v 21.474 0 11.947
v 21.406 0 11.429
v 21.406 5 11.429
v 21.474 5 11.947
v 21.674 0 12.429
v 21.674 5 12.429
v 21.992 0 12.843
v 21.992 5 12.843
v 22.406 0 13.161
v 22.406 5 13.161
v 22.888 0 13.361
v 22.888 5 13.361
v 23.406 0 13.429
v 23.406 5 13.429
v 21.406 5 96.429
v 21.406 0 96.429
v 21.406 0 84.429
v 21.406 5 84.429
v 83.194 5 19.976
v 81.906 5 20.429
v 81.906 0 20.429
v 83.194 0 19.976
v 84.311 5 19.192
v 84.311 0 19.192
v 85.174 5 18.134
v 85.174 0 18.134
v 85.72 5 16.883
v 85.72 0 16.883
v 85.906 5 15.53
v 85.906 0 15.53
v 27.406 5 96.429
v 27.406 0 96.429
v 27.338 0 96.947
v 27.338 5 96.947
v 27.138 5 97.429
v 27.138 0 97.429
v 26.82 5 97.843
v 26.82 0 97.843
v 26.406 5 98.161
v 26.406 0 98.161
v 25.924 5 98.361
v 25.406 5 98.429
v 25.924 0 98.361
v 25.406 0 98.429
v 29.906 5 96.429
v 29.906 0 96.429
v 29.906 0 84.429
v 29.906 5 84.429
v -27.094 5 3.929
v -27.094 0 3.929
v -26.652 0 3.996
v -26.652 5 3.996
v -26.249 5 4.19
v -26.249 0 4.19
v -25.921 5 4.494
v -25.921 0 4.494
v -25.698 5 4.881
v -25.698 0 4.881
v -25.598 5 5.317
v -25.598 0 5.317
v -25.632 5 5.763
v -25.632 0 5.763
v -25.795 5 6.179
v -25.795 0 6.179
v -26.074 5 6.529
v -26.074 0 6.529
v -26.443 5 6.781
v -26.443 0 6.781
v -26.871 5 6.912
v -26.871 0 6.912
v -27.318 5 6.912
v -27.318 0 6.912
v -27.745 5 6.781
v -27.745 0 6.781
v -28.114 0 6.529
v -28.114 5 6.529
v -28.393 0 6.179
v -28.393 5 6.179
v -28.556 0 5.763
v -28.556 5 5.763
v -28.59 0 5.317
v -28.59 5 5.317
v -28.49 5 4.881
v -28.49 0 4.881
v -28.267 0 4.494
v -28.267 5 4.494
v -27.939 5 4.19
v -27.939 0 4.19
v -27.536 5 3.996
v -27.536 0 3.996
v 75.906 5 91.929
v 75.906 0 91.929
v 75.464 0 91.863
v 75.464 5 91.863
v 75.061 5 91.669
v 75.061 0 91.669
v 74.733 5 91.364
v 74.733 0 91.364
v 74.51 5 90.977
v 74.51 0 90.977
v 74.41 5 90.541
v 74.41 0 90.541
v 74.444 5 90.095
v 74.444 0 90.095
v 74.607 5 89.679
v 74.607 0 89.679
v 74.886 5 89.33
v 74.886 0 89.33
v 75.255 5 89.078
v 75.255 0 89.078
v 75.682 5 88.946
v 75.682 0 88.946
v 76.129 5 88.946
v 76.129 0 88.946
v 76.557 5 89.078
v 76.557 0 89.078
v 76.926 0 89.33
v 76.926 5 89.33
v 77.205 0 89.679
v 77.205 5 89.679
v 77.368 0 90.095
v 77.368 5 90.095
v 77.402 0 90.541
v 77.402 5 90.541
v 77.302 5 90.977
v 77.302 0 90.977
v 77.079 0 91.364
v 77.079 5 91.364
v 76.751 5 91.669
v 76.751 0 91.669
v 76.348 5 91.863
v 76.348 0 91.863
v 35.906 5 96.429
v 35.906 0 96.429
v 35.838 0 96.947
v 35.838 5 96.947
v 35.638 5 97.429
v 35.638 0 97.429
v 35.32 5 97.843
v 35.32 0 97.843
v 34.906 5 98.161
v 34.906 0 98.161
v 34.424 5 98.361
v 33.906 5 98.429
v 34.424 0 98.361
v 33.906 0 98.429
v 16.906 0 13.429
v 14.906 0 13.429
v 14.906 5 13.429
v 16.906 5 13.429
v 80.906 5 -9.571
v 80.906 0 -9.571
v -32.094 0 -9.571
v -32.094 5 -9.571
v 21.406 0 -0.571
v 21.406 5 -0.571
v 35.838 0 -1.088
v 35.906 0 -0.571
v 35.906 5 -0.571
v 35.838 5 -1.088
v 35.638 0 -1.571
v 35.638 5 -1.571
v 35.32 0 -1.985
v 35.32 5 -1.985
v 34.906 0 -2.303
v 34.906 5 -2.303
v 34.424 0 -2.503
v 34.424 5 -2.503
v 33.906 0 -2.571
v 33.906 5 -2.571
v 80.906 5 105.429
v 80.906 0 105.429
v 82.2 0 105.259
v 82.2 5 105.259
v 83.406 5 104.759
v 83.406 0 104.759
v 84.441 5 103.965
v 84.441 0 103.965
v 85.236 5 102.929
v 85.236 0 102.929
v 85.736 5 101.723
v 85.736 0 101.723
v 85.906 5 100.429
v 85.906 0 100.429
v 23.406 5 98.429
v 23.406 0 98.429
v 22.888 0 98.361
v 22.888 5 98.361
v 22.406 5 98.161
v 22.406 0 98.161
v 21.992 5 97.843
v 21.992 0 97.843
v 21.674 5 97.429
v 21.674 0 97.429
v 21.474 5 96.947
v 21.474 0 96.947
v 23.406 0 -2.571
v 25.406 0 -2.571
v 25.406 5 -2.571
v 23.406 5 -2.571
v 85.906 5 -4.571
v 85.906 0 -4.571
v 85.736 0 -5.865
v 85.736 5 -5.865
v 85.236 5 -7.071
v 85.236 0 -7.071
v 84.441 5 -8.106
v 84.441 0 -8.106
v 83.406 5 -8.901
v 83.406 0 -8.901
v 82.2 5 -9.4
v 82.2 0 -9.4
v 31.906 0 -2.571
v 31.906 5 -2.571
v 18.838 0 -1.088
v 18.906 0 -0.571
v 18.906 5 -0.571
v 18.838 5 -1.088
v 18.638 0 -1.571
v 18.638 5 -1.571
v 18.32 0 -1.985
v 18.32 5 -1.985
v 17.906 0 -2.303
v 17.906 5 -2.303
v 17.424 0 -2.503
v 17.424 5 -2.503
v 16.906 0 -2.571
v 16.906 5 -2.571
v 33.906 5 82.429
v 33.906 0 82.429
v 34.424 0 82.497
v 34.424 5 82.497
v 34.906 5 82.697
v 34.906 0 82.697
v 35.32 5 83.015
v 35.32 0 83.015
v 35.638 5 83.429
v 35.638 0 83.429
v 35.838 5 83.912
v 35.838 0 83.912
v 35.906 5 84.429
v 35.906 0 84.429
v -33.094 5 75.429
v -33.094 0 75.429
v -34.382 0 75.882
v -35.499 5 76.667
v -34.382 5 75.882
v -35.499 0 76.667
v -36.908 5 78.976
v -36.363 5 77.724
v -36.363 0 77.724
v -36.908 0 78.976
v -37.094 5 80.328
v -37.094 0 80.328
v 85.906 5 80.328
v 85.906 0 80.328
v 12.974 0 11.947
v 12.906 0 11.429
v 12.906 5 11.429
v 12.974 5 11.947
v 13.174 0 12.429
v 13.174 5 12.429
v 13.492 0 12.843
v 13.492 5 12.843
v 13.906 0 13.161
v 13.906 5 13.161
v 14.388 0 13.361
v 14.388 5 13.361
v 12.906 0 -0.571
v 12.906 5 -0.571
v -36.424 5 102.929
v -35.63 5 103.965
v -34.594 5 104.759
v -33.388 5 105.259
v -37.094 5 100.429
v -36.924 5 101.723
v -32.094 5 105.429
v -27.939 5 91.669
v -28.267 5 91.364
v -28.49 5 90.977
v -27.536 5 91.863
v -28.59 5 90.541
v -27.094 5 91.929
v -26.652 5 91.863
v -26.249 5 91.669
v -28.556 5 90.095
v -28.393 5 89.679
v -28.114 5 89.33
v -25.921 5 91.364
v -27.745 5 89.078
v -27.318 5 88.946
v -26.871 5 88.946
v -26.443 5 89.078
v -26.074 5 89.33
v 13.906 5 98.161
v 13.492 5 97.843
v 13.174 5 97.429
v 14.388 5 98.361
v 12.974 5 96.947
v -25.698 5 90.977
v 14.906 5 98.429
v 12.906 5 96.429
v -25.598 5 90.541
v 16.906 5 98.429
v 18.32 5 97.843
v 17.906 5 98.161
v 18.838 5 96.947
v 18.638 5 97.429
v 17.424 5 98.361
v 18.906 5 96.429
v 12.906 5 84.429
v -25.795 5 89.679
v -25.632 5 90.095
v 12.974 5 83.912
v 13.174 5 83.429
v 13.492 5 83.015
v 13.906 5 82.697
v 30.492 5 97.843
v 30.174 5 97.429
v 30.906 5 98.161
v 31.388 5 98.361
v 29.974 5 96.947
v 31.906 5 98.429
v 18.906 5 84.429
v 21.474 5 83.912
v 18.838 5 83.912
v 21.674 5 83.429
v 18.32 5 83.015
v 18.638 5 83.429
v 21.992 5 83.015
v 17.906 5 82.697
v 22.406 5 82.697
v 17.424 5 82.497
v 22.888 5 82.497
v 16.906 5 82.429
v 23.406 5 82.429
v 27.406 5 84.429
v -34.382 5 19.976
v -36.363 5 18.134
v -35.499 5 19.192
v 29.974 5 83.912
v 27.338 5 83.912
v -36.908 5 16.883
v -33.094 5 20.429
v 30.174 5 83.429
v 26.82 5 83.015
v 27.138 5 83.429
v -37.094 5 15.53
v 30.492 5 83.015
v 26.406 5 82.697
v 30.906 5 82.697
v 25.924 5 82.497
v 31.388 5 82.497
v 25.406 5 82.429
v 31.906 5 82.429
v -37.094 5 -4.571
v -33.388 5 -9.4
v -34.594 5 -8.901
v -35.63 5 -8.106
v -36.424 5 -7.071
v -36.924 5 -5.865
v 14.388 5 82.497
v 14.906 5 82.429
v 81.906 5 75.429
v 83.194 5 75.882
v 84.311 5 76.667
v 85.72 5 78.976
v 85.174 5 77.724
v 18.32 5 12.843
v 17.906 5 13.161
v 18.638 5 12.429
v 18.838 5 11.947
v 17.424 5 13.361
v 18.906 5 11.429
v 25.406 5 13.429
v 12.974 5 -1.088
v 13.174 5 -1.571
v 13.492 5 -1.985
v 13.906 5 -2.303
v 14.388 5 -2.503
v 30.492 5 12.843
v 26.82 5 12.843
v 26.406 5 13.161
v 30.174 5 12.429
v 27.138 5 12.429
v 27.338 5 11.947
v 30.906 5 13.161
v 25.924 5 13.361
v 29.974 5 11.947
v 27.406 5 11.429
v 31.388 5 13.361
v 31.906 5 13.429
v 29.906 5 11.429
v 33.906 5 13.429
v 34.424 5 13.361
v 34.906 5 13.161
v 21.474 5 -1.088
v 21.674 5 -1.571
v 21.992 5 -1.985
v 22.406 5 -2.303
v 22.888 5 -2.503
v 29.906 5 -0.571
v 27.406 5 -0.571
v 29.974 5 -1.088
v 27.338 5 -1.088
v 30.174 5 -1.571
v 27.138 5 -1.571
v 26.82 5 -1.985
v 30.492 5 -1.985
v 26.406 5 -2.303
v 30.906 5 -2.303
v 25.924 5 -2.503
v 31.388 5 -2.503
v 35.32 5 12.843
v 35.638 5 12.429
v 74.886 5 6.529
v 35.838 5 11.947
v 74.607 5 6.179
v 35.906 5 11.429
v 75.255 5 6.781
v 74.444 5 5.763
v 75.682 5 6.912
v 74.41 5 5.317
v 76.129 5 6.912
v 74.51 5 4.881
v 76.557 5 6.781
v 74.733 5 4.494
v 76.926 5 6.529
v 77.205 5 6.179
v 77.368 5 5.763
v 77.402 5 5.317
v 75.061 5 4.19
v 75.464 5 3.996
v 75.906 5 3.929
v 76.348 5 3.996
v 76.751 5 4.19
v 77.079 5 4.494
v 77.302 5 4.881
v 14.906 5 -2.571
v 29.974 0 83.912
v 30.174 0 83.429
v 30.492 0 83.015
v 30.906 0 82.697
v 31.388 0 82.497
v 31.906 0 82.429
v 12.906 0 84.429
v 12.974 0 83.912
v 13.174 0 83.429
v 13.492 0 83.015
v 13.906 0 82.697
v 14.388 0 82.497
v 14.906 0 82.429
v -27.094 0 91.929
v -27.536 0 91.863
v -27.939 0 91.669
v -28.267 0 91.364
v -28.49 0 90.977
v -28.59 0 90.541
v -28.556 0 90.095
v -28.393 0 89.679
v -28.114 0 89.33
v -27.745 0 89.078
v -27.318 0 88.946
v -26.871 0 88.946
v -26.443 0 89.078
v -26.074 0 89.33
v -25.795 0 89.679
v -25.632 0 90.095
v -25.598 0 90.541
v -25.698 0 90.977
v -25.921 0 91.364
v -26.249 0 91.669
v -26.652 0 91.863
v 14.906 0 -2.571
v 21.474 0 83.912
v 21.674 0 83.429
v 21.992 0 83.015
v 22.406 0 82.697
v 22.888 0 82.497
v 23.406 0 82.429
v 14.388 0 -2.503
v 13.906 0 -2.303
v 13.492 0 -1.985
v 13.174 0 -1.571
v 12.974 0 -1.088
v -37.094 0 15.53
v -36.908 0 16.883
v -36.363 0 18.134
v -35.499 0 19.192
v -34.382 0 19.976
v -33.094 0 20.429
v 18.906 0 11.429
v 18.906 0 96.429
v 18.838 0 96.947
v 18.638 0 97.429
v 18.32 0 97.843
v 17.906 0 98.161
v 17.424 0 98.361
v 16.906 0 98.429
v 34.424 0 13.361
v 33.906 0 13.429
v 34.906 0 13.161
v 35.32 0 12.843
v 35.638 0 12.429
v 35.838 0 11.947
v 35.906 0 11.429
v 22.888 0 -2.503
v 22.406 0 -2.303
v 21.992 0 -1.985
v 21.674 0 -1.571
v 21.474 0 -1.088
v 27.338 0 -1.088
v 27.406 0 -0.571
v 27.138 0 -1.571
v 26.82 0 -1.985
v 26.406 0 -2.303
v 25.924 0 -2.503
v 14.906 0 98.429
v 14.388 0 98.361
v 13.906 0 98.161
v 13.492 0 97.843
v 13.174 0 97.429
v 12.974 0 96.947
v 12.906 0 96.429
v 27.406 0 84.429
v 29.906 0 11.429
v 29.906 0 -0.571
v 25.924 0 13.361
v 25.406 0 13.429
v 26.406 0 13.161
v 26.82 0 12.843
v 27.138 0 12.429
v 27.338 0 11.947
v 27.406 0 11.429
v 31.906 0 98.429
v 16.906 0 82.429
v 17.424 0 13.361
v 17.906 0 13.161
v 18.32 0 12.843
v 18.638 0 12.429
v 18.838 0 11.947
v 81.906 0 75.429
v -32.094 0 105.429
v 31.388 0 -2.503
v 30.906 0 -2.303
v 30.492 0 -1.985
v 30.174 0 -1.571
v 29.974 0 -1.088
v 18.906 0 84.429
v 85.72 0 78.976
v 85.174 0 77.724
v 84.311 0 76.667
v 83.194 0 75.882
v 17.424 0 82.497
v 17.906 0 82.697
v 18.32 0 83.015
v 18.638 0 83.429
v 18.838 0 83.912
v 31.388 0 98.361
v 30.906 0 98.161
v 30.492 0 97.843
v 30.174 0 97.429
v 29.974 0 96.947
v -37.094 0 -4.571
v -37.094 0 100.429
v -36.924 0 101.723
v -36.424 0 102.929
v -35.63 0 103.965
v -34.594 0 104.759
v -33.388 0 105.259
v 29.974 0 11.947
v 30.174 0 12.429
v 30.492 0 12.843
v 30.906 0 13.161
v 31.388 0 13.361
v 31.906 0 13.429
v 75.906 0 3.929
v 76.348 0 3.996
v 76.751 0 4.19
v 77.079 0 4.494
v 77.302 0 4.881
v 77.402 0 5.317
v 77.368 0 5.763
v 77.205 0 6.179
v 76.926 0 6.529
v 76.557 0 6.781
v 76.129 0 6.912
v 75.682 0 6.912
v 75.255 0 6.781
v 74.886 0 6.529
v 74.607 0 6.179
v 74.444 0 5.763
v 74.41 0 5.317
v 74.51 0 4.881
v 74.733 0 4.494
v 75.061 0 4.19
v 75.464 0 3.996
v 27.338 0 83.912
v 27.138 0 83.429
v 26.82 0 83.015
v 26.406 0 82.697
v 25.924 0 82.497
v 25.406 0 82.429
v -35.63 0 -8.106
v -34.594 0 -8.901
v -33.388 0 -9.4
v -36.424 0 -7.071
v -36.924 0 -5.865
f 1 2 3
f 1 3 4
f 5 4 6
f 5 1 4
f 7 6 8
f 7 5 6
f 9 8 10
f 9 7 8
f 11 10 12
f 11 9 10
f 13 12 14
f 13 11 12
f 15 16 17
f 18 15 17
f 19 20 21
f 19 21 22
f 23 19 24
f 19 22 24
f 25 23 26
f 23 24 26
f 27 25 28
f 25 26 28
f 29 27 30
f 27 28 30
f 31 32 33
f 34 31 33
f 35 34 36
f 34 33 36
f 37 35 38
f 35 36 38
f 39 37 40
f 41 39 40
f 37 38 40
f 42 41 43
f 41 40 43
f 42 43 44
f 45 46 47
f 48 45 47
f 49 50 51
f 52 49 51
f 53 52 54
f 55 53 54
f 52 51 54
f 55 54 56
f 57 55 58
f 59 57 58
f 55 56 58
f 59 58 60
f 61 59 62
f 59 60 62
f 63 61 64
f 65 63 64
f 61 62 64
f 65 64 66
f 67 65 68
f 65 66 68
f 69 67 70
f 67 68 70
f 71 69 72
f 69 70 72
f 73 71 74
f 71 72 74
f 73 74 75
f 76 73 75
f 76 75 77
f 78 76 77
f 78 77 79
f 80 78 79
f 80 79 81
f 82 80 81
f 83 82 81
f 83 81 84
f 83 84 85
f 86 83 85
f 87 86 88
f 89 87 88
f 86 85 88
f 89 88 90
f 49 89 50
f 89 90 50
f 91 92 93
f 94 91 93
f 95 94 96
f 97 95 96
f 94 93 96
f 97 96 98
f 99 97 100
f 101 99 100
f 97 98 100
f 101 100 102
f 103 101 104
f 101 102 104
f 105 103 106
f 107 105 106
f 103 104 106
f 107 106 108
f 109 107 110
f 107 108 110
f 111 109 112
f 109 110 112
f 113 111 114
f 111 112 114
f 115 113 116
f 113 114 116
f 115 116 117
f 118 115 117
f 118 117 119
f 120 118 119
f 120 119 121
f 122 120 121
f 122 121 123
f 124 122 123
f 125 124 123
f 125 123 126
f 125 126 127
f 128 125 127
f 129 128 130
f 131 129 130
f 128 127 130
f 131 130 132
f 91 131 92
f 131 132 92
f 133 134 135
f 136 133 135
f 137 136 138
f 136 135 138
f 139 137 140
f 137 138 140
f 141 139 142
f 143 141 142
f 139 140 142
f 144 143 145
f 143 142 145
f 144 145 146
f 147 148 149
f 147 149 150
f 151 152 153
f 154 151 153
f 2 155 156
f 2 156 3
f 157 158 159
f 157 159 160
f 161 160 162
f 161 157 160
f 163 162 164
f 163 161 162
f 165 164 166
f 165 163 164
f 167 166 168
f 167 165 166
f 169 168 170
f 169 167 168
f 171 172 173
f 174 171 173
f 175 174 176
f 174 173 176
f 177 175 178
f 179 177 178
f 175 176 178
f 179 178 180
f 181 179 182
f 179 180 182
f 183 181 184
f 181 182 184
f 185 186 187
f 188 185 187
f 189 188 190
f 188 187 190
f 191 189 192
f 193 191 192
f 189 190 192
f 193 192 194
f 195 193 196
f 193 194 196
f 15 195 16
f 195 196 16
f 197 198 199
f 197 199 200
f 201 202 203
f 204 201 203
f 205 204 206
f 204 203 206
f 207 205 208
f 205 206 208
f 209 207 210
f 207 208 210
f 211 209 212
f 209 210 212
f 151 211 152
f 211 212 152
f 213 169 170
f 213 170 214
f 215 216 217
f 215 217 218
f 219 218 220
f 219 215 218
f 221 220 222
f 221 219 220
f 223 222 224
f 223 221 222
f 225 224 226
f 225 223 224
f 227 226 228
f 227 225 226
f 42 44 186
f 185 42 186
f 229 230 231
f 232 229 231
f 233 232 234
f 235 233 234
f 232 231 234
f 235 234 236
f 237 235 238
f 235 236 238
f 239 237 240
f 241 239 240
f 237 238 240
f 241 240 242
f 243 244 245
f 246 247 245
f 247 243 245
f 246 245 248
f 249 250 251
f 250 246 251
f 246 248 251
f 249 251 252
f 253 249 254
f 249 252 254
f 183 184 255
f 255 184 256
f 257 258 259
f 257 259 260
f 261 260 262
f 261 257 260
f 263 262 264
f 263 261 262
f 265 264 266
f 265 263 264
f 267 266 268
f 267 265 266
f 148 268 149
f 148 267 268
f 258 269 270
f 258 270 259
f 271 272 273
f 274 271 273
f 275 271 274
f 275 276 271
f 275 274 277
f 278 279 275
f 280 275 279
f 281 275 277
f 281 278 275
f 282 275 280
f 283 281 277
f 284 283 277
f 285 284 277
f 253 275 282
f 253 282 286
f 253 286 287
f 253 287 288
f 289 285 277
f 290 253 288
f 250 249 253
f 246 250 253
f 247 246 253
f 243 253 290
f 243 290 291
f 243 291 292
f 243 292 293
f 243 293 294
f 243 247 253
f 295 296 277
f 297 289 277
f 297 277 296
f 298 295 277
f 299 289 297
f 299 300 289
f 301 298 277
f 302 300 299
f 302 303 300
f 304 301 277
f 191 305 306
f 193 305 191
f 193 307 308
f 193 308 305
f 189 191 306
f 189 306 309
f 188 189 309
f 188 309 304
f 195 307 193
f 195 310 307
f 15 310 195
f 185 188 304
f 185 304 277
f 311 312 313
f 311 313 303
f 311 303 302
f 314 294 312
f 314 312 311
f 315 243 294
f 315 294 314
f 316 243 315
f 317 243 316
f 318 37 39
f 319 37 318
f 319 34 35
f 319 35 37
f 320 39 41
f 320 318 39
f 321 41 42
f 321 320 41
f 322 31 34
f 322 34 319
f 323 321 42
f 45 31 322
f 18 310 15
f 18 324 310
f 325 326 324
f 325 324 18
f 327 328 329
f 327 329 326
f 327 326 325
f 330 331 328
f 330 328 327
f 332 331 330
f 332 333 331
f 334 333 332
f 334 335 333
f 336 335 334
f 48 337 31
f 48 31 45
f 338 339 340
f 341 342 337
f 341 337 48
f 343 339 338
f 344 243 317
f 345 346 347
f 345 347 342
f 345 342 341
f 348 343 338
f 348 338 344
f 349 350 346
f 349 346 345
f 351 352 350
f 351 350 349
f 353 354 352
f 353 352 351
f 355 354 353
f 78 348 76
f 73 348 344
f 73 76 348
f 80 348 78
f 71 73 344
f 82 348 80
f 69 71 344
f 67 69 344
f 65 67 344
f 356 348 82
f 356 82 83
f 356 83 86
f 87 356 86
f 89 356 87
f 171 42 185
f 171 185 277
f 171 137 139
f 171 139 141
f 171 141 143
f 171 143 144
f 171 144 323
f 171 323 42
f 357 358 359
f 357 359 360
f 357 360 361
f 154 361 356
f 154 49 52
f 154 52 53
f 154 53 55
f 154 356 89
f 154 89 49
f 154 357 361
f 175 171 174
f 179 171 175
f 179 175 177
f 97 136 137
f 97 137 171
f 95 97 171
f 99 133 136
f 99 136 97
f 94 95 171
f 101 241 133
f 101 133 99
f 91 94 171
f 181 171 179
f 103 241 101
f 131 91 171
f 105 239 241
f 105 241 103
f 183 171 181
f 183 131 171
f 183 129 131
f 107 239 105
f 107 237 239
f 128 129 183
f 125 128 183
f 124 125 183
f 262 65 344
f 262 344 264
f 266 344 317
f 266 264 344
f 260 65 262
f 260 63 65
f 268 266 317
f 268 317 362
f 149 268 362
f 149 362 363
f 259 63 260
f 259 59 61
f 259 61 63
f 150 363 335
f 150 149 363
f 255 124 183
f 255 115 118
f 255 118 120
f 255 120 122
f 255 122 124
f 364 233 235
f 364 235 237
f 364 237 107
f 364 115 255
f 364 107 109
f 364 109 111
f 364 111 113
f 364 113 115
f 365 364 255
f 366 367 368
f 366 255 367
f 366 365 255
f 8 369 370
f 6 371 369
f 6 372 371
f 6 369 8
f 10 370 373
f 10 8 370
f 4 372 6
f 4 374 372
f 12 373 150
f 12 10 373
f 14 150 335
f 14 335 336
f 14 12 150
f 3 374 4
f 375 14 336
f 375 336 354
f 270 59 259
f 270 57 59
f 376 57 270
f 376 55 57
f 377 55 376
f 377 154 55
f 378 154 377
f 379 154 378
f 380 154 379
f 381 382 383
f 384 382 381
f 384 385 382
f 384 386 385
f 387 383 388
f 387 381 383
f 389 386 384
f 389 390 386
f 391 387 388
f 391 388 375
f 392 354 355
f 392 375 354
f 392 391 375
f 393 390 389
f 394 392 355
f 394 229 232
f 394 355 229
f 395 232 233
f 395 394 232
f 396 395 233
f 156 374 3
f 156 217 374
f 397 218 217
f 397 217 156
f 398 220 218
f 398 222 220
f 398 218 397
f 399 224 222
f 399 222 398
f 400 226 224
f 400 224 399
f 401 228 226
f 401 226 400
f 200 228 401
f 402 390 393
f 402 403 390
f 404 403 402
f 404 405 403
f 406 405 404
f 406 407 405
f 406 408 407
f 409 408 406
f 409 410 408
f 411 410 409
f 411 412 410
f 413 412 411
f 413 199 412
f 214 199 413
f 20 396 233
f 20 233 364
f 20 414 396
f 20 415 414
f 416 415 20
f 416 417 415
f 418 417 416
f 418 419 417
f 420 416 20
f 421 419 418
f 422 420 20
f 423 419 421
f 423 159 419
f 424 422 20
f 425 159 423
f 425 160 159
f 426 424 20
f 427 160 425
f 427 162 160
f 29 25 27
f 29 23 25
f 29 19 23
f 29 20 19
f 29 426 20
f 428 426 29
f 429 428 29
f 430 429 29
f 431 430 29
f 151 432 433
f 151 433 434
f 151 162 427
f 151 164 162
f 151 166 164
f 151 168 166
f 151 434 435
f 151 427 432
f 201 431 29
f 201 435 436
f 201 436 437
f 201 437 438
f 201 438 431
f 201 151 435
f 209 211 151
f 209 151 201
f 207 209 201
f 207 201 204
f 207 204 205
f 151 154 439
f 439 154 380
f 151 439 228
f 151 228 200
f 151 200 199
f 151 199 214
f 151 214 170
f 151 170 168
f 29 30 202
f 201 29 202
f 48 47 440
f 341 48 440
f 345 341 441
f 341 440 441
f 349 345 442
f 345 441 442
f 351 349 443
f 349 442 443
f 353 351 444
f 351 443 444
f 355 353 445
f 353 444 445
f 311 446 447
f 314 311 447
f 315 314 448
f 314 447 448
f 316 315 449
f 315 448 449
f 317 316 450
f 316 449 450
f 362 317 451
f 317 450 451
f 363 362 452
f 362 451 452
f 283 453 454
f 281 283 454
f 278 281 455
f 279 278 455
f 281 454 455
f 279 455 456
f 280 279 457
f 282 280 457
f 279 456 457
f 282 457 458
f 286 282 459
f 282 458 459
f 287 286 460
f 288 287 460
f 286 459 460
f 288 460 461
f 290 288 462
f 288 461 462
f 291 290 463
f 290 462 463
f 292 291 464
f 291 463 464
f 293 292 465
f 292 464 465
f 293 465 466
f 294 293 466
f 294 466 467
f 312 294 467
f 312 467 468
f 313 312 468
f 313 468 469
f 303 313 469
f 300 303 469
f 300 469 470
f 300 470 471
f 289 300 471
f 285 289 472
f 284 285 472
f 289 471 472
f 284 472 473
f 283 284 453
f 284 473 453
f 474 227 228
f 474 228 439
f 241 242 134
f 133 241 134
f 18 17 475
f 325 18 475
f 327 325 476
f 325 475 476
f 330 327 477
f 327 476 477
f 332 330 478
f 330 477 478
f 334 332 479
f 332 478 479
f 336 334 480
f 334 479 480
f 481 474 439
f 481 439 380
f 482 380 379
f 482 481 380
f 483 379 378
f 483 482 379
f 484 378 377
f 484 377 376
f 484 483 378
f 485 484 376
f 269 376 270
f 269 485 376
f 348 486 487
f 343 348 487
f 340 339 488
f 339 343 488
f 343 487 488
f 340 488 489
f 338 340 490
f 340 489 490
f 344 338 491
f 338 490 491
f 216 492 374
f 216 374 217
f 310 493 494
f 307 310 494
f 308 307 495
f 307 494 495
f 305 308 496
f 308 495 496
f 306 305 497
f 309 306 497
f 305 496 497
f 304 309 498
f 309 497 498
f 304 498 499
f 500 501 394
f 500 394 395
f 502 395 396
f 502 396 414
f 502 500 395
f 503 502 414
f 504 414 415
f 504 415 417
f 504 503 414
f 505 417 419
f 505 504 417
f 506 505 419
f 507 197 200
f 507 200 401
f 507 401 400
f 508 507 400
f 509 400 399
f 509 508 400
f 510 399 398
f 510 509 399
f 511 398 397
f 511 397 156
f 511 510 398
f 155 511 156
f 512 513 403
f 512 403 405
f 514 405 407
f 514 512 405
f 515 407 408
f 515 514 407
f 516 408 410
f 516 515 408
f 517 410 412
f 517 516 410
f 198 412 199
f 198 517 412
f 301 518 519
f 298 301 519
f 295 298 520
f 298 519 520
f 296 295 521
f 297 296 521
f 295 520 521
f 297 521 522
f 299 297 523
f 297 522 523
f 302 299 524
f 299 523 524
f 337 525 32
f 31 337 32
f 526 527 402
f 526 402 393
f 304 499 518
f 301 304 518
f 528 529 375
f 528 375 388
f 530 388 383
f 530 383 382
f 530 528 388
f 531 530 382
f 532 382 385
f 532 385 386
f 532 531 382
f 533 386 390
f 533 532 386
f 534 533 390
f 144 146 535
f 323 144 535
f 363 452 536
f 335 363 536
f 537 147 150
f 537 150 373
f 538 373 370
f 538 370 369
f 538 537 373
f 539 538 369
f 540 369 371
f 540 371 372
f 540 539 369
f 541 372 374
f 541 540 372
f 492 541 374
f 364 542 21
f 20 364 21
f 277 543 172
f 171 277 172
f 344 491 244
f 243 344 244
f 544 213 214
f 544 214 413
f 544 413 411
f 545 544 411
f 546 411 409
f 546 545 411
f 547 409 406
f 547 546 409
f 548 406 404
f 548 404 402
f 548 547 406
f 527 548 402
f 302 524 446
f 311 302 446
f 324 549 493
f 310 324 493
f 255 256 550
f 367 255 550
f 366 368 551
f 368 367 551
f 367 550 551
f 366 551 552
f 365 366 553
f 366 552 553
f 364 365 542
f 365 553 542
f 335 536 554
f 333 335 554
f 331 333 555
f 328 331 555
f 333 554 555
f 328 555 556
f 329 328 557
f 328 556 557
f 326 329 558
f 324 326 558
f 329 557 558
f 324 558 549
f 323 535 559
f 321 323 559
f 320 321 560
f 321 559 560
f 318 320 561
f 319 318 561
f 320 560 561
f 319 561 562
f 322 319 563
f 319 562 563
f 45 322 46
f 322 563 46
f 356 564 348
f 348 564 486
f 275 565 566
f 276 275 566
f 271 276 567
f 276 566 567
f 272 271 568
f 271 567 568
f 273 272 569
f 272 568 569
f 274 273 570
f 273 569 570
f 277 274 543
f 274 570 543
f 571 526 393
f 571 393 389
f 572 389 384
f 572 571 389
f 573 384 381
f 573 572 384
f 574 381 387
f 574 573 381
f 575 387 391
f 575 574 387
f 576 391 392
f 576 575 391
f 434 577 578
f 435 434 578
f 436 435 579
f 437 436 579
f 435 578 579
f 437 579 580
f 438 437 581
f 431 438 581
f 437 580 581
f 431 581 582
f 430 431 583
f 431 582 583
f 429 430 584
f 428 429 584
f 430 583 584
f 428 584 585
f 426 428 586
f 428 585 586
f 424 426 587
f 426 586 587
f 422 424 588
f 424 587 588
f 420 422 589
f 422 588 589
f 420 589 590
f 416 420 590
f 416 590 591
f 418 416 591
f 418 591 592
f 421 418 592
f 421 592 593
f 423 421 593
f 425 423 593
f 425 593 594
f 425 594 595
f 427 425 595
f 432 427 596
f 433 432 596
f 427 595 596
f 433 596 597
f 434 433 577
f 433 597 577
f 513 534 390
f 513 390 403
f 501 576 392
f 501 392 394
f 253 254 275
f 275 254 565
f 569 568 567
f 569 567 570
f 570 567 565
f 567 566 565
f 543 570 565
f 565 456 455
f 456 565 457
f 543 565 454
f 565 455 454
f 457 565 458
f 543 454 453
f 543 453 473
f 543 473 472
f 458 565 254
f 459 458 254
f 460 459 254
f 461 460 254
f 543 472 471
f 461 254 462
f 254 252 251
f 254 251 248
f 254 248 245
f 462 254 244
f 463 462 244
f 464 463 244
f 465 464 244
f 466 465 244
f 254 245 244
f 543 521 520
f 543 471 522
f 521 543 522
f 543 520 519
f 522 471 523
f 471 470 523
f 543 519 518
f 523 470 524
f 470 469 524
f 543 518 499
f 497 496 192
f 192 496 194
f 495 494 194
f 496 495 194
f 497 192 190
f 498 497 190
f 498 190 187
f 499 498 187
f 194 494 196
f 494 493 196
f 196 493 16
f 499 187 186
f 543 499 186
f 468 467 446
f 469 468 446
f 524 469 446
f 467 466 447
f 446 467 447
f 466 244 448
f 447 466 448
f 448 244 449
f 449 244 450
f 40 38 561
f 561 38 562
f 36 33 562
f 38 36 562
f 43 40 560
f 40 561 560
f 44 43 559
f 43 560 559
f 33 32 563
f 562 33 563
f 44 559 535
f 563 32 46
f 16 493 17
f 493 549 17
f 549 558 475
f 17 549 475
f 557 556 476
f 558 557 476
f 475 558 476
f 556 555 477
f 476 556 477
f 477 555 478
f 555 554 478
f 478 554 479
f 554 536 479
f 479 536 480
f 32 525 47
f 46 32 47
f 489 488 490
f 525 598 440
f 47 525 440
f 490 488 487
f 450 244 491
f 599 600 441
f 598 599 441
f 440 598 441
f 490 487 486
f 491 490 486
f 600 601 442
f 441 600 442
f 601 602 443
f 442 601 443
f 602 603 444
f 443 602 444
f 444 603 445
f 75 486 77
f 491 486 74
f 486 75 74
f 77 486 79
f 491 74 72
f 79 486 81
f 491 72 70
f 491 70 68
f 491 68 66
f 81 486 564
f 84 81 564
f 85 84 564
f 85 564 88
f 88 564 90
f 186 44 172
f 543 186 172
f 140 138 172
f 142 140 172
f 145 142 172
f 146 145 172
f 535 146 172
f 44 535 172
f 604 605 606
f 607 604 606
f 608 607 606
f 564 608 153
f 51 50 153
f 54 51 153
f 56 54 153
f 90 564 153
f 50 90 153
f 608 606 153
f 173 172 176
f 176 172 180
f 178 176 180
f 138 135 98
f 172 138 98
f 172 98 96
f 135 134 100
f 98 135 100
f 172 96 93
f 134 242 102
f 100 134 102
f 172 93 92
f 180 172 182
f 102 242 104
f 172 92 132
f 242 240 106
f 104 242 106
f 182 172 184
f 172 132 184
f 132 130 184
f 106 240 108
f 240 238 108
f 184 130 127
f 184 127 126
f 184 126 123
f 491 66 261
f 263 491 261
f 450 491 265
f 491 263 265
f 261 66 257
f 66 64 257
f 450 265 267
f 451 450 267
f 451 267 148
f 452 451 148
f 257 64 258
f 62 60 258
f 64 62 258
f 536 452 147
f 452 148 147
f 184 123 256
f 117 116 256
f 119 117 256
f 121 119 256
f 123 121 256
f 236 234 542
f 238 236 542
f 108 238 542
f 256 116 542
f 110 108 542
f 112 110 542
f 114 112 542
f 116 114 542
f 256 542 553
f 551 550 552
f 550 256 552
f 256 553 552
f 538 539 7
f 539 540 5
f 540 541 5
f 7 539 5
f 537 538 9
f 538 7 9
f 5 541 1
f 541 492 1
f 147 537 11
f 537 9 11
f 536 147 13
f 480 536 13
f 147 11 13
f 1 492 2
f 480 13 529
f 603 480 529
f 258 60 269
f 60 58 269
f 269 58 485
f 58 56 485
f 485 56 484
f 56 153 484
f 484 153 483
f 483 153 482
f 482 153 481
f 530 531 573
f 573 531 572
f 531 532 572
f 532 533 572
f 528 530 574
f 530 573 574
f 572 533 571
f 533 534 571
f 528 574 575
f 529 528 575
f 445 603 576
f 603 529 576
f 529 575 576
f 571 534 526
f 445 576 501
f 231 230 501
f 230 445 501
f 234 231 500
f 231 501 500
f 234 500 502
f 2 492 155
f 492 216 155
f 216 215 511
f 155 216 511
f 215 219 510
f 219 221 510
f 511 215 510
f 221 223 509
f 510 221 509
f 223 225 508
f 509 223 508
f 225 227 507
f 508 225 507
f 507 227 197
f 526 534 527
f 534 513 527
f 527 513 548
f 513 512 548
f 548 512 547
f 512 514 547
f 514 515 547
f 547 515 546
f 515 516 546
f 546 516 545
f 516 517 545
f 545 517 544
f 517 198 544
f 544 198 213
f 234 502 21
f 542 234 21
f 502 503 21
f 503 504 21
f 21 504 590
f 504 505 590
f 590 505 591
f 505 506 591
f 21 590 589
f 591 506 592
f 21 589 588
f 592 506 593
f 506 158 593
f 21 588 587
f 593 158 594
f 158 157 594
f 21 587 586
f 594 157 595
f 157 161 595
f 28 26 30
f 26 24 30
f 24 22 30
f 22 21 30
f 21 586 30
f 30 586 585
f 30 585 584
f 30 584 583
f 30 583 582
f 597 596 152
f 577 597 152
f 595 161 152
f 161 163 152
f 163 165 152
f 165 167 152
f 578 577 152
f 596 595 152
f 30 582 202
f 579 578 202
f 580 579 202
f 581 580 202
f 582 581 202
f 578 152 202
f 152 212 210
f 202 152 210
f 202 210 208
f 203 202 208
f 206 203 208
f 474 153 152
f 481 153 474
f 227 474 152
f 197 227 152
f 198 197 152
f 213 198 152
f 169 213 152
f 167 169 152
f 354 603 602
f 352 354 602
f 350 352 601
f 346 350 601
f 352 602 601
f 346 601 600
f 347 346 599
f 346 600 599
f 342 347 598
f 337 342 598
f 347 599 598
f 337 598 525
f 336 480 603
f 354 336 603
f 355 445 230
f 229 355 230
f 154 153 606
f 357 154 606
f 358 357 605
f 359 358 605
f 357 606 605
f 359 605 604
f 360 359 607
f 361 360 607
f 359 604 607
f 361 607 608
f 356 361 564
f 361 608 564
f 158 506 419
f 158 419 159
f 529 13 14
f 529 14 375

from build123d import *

# Parameters (mm, degrees)
RESSALTO_EXTRUS_O1_DEPTH = 5
FILETE1_R                = 5
ESBO_O3_R                = 1.5
CORTE_EXTRUS_O1_DEPTH    = 5


with BuildPart() as part:
    # Esboço1 → Ressalto-extrusão1 (new body)
    with BuildSketch(Plane(origin=(0, 0, 0), x_dir=(1, 0, 0), z_dir=(0, 1, 0))):
        with BuildLine():
            Line((81.90590785, -20.429188404), (85.90590785, -20.429188404))
            Line((85.90590785, -20.429188404), (85.90590785, 4.570811596))
            ThreePointArc((85.90590785, 4.570811596), (84.441441756, 8.106345502), (80.90590785, 9.570811596))
            Line((80.90590785, 9.570811596), (-32.09409215, 9.570811596))
            ThreePointArc((-32.09409215, 9.570811596), (-35.629626056, 8.106345502), (-37.09409215, 4.570811596))
            Line((-37.09409215, 4.570811596), (-37.09409215, -20.429188404))
            Line((-37.09409215, -20.429188404), (-33.09409215, -20.429188404))
            Line((-33.09409215, -20.429188404), (-33.09409215, -75.429188404))
            Line((-33.09409215, -75.429188404), (-37.09409215, -75.429188404))
            Line((-37.09409215, -75.429188404), (-37.09409215, -100.429188404))
            ThreePointArc((-37.09409215, -100.429188404), (-35.629626056, -103.96472231), (-32.09409215, -105.429188404))
            Line((-32.09409215, -105.429188404), (80.90590785, -105.429188404))
            ThreePointArc((80.90590785, -105.429188404), (84.441441756, -103.96472231), (85.90590785, -100.429188404))
            Line((85.90590785, -100.429188404), (85.90590785, -75.429188404))
            Line((85.90590785, -75.429188404), (81.90590785, -75.429188404))
            Line((81.90590785, -75.429188404), (81.90590785, -20.429188404))
        make_face()
    extrude(amount=RESSALTO_EXTRUS_O1_DEPTH)

    # Filete1
    # the kernel refuses this fillet: 5 mm, written as the material it takes off along each edge
    with BuildSketch(Plane(origin=(-37.09409215, -12.247448714, 75.429188404), x_dir=(1.0, 0, 1.5738521597081158e-12), z_dir=(0, 1, 0)), Plane(origin=(85.90590785, -12.247448714, 20.429188404), x_dir=(-1.0, 0, -1.5685230891899197e-12), z_dir=(0, 1, 0))) as filete1_piece_1:
        with BuildLine():
            CenterArc((5, -4.898979486), FILETE1_R, 101.536959033, 78.463040967)
            Line((0, -4.898979486), (-0.1, -4.898979486))
            Line((-0.1, -4.898979486), (-0.1, 0))
            Line((-0.1, 0), (0, 0.1))
            ThreePointArc((0, 0.1), (2, 0.1), (3.98, 0.09797959))
            Line((3.98, 0.09797959), (4, 0))
        make_face()
    extrude(amount=29.494897428, mode=Mode.SUBTRACT)
    with BuildSketch(Plane(origin=(-37.09409215, -12.247448714, 20.429188404), x_dir=(0, 0, -1), z_dir=(0, 1, 0)), Plane(origin=(85.90590785, -12.247448714, 75.429188404), x_dir=(0, 0, 1), z_dir=(0, 1, 0))) as filete1_piece_2:
        with BuildLine():
            CenterArc((4.898979486, -5), FILETE1_R, 90, 78.463040967)
            Line((0, -4), (-0.09797959, -3.98))
            ThreePointArc((-0.09797959, -3.98), (-0.1, -2), (-0.1, 0))
            Line((-0.1, 0), (0, 0.1))
            Line((0, 0.1), (4.898979486, 0.1))
            Line((4.898979486, 0.1), (4.898979486, 0))
        make_face()
    extrude(amount=29.494897428, mode=Mode.SUBTRACT)

    # Esboço3 → Corte-extrusão1 (cut)
    with BuildSketch(Plane.XZ):
        with Locations(Location((-27.09409215, 5.429188404, 0), (0, 0, 270))):
            Circle(ESBO_O3_R)
        with Locations(Location((75.90590785, 5.429188404, 0), (0, 0, 270))):
            Circle(ESBO_O3_R)
        with Locations(Location((75.90590785, 90.429188404, 0), (0, 0, 90))):
            Circle(ESBO_O3_R)
        with Locations(Location((-27.09409215, 90.429188404, 0), (0, 0, 90))):
            Circle(ESBO_O3_R)
        with BuildLine():
            Line((35.90590785, 84.429188404), (35.90590785, 96.429188404))
            ThreePointArc((35.90590785, 96.429188404), (35.320121412, 97.843401966), (33.90590785, 98.429188404))
            Line((33.90590785, 98.429188404), (31.90590785, 98.429188404))
            ThreePointArc((31.90590785, 98.429188404), (30.491694287, 97.843401966), (29.90590785, 96.429188404))
            Line((29.90590785, 96.429188404), (29.90590785, 84.429188404))
            ThreePointArc((29.90590785, 84.429188404), (30.491694287, 83.014974841), (31.90590785, 82.429188404))
            Line((31.90590785, 82.429188404), (33.90590785, 82.429188404))
            ThreePointArc((33.90590785, 82.429188404), (35.320121412, 83.014974841), (35.90590785, 84.429188404))
        make_face()
        with BuildLine():
            Line((14.90590785, 13.429188404), (16.90590785, 13.429188404))
            ThreePointArc((16.90590785, 13.429188404), (18.320121412, 12.843401966), (18.90590785, 11.429188404))
            Line((18.90590785, 11.429188404), (18.90590785, -0.570811596))
            ThreePointArc((18.90590785, -0.570811596), (18.320121412, -1.985025159), (16.90590785, -2.570811596))
            Line((16.90590785, -2.570811596), (14.90590785, -2.570811596))
            ThreePointArc((14.90590785, -2.570811596), (13.491694287, -1.985025159), (12.90590785, -0.570811596))
            Line((12.90590785, -0.570811596), (12.90590785, 11.429188404))
            ThreePointArc((12.90590785, 11.429188404), (13.491694287, 12.843401966), (14.90590785, 13.429188404))
        make_face()
        with BuildLine():
            Line((23.40590785, 13.429188404), (25.40590785, 13.429188404))
            ThreePointArc((25.40590785, 13.429188404), (26.820121412, 12.843401966), (27.40590785, 11.429188404))
            Line((27.40590785, 11.429188404), (27.40590785, -0.570811596))
            ThreePointArc((27.40590785, -0.570811596), (26.820121412, -1.985025159), (25.40590785, -2.570811596))
            Line((25.40590785, -2.570811596), (23.40590785, -2.570811596))
            ThreePointArc((23.40590785, -2.570811596), (21.991694287, -1.985025159), (21.40590785, -0.570811596))
            Line((21.40590785, -0.570811596), (21.40590785, 11.429188404))
            ThreePointArc((21.40590785, 11.429188404), (21.991694287, 12.843401966), (23.40590785, 13.429188404))
        make_face()
        with BuildLine():
            Line((31.90590785, 13.429188404), (33.90590785, 13.429188404))
            ThreePointArc((33.90590785, 13.429188404), (35.320121412, 12.843401966), (35.90590785, 11.429188404))
            Line((35.90590785, 11.429188404), (35.90590785, -0.570811596))
            ThreePointArc((35.90590785, -0.570811596), (35.320121412, -1.985025159), (33.90590785, -2.570811596))
            Line((33.90590785, -2.570811596), (31.90590785, -2.570811596))
            ThreePointArc((31.90590785, -2.570811596), (30.491694287, -1.985025159), (29.90590785, -0.570811596))
            Line((29.90590785, -0.570811596), (29.90590785, 11.429188404))
            ThreePointArc((29.90590785, 11.429188404), (30.491694287, 12.843401966), (31.90590785, 13.429188404))
        make_face()
        with BuildLine():
            Line((27.40590785, 84.429188404), (27.40590785, 96.429188404))
            ThreePointArc((27.40590785, 96.429188404), (26.820121412, 97.843401966), (25.40590785, 98.429188404))
            Line((25.40590785, 98.429188404), (23.40590785, 98.429188404))
            ThreePointArc((23.40590785, 98.429188404), (21.991694287, 97.843401966), (21.40590785, 96.429188404))
            Line((21.40590785, 96.429188404), (21.40590785, 84.429188404))
            ThreePointArc((21.40590785, 84.429188404), (21.991694287, 83.014974841), (23.40590785, 82.429188404))
            Line((23.40590785, 82.429188404), (25.40590785, 82.429188404))
            ThreePointArc((25.40590785, 82.429188404), (26.820121412, 83.014974841), (27.40590785, 84.429188404))
        make_face()
        with BuildLine():
            Line((18.90590785, 84.429188404), (18.90590785, 96.429188404))
            ThreePointArc((18.90590785, 96.429188404), (18.320121412, 97.843401966), (16.90590785, 98.429188404))
            Line((16.90590785, 98.429188404), (14.90590785, 98.429188404))
            ThreePointArc((14.90590785, 98.429188404), (13.491694287, 97.843401966), (12.90590785, 96.429188404))
            Line((12.90590785, 96.429188404), (12.90590785, 84.429188404))
            ThreePointArc((12.90590785, 84.429188404), (13.491694287, 83.014974841), (14.90590785, 82.429188404))
            Line((14.90590785, 82.429188404), (16.90590785, 82.429188404))
            ThreePointArc((16.90590785, 82.429188404), (18.320121412, 83.014974841), (18.90590785, 84.429188404))
        make_face()
    extrude(amount=-CORTE_EXTRUS_O1_DEPTH, mode=Mode.SUBTRACT)


solid = part.part
